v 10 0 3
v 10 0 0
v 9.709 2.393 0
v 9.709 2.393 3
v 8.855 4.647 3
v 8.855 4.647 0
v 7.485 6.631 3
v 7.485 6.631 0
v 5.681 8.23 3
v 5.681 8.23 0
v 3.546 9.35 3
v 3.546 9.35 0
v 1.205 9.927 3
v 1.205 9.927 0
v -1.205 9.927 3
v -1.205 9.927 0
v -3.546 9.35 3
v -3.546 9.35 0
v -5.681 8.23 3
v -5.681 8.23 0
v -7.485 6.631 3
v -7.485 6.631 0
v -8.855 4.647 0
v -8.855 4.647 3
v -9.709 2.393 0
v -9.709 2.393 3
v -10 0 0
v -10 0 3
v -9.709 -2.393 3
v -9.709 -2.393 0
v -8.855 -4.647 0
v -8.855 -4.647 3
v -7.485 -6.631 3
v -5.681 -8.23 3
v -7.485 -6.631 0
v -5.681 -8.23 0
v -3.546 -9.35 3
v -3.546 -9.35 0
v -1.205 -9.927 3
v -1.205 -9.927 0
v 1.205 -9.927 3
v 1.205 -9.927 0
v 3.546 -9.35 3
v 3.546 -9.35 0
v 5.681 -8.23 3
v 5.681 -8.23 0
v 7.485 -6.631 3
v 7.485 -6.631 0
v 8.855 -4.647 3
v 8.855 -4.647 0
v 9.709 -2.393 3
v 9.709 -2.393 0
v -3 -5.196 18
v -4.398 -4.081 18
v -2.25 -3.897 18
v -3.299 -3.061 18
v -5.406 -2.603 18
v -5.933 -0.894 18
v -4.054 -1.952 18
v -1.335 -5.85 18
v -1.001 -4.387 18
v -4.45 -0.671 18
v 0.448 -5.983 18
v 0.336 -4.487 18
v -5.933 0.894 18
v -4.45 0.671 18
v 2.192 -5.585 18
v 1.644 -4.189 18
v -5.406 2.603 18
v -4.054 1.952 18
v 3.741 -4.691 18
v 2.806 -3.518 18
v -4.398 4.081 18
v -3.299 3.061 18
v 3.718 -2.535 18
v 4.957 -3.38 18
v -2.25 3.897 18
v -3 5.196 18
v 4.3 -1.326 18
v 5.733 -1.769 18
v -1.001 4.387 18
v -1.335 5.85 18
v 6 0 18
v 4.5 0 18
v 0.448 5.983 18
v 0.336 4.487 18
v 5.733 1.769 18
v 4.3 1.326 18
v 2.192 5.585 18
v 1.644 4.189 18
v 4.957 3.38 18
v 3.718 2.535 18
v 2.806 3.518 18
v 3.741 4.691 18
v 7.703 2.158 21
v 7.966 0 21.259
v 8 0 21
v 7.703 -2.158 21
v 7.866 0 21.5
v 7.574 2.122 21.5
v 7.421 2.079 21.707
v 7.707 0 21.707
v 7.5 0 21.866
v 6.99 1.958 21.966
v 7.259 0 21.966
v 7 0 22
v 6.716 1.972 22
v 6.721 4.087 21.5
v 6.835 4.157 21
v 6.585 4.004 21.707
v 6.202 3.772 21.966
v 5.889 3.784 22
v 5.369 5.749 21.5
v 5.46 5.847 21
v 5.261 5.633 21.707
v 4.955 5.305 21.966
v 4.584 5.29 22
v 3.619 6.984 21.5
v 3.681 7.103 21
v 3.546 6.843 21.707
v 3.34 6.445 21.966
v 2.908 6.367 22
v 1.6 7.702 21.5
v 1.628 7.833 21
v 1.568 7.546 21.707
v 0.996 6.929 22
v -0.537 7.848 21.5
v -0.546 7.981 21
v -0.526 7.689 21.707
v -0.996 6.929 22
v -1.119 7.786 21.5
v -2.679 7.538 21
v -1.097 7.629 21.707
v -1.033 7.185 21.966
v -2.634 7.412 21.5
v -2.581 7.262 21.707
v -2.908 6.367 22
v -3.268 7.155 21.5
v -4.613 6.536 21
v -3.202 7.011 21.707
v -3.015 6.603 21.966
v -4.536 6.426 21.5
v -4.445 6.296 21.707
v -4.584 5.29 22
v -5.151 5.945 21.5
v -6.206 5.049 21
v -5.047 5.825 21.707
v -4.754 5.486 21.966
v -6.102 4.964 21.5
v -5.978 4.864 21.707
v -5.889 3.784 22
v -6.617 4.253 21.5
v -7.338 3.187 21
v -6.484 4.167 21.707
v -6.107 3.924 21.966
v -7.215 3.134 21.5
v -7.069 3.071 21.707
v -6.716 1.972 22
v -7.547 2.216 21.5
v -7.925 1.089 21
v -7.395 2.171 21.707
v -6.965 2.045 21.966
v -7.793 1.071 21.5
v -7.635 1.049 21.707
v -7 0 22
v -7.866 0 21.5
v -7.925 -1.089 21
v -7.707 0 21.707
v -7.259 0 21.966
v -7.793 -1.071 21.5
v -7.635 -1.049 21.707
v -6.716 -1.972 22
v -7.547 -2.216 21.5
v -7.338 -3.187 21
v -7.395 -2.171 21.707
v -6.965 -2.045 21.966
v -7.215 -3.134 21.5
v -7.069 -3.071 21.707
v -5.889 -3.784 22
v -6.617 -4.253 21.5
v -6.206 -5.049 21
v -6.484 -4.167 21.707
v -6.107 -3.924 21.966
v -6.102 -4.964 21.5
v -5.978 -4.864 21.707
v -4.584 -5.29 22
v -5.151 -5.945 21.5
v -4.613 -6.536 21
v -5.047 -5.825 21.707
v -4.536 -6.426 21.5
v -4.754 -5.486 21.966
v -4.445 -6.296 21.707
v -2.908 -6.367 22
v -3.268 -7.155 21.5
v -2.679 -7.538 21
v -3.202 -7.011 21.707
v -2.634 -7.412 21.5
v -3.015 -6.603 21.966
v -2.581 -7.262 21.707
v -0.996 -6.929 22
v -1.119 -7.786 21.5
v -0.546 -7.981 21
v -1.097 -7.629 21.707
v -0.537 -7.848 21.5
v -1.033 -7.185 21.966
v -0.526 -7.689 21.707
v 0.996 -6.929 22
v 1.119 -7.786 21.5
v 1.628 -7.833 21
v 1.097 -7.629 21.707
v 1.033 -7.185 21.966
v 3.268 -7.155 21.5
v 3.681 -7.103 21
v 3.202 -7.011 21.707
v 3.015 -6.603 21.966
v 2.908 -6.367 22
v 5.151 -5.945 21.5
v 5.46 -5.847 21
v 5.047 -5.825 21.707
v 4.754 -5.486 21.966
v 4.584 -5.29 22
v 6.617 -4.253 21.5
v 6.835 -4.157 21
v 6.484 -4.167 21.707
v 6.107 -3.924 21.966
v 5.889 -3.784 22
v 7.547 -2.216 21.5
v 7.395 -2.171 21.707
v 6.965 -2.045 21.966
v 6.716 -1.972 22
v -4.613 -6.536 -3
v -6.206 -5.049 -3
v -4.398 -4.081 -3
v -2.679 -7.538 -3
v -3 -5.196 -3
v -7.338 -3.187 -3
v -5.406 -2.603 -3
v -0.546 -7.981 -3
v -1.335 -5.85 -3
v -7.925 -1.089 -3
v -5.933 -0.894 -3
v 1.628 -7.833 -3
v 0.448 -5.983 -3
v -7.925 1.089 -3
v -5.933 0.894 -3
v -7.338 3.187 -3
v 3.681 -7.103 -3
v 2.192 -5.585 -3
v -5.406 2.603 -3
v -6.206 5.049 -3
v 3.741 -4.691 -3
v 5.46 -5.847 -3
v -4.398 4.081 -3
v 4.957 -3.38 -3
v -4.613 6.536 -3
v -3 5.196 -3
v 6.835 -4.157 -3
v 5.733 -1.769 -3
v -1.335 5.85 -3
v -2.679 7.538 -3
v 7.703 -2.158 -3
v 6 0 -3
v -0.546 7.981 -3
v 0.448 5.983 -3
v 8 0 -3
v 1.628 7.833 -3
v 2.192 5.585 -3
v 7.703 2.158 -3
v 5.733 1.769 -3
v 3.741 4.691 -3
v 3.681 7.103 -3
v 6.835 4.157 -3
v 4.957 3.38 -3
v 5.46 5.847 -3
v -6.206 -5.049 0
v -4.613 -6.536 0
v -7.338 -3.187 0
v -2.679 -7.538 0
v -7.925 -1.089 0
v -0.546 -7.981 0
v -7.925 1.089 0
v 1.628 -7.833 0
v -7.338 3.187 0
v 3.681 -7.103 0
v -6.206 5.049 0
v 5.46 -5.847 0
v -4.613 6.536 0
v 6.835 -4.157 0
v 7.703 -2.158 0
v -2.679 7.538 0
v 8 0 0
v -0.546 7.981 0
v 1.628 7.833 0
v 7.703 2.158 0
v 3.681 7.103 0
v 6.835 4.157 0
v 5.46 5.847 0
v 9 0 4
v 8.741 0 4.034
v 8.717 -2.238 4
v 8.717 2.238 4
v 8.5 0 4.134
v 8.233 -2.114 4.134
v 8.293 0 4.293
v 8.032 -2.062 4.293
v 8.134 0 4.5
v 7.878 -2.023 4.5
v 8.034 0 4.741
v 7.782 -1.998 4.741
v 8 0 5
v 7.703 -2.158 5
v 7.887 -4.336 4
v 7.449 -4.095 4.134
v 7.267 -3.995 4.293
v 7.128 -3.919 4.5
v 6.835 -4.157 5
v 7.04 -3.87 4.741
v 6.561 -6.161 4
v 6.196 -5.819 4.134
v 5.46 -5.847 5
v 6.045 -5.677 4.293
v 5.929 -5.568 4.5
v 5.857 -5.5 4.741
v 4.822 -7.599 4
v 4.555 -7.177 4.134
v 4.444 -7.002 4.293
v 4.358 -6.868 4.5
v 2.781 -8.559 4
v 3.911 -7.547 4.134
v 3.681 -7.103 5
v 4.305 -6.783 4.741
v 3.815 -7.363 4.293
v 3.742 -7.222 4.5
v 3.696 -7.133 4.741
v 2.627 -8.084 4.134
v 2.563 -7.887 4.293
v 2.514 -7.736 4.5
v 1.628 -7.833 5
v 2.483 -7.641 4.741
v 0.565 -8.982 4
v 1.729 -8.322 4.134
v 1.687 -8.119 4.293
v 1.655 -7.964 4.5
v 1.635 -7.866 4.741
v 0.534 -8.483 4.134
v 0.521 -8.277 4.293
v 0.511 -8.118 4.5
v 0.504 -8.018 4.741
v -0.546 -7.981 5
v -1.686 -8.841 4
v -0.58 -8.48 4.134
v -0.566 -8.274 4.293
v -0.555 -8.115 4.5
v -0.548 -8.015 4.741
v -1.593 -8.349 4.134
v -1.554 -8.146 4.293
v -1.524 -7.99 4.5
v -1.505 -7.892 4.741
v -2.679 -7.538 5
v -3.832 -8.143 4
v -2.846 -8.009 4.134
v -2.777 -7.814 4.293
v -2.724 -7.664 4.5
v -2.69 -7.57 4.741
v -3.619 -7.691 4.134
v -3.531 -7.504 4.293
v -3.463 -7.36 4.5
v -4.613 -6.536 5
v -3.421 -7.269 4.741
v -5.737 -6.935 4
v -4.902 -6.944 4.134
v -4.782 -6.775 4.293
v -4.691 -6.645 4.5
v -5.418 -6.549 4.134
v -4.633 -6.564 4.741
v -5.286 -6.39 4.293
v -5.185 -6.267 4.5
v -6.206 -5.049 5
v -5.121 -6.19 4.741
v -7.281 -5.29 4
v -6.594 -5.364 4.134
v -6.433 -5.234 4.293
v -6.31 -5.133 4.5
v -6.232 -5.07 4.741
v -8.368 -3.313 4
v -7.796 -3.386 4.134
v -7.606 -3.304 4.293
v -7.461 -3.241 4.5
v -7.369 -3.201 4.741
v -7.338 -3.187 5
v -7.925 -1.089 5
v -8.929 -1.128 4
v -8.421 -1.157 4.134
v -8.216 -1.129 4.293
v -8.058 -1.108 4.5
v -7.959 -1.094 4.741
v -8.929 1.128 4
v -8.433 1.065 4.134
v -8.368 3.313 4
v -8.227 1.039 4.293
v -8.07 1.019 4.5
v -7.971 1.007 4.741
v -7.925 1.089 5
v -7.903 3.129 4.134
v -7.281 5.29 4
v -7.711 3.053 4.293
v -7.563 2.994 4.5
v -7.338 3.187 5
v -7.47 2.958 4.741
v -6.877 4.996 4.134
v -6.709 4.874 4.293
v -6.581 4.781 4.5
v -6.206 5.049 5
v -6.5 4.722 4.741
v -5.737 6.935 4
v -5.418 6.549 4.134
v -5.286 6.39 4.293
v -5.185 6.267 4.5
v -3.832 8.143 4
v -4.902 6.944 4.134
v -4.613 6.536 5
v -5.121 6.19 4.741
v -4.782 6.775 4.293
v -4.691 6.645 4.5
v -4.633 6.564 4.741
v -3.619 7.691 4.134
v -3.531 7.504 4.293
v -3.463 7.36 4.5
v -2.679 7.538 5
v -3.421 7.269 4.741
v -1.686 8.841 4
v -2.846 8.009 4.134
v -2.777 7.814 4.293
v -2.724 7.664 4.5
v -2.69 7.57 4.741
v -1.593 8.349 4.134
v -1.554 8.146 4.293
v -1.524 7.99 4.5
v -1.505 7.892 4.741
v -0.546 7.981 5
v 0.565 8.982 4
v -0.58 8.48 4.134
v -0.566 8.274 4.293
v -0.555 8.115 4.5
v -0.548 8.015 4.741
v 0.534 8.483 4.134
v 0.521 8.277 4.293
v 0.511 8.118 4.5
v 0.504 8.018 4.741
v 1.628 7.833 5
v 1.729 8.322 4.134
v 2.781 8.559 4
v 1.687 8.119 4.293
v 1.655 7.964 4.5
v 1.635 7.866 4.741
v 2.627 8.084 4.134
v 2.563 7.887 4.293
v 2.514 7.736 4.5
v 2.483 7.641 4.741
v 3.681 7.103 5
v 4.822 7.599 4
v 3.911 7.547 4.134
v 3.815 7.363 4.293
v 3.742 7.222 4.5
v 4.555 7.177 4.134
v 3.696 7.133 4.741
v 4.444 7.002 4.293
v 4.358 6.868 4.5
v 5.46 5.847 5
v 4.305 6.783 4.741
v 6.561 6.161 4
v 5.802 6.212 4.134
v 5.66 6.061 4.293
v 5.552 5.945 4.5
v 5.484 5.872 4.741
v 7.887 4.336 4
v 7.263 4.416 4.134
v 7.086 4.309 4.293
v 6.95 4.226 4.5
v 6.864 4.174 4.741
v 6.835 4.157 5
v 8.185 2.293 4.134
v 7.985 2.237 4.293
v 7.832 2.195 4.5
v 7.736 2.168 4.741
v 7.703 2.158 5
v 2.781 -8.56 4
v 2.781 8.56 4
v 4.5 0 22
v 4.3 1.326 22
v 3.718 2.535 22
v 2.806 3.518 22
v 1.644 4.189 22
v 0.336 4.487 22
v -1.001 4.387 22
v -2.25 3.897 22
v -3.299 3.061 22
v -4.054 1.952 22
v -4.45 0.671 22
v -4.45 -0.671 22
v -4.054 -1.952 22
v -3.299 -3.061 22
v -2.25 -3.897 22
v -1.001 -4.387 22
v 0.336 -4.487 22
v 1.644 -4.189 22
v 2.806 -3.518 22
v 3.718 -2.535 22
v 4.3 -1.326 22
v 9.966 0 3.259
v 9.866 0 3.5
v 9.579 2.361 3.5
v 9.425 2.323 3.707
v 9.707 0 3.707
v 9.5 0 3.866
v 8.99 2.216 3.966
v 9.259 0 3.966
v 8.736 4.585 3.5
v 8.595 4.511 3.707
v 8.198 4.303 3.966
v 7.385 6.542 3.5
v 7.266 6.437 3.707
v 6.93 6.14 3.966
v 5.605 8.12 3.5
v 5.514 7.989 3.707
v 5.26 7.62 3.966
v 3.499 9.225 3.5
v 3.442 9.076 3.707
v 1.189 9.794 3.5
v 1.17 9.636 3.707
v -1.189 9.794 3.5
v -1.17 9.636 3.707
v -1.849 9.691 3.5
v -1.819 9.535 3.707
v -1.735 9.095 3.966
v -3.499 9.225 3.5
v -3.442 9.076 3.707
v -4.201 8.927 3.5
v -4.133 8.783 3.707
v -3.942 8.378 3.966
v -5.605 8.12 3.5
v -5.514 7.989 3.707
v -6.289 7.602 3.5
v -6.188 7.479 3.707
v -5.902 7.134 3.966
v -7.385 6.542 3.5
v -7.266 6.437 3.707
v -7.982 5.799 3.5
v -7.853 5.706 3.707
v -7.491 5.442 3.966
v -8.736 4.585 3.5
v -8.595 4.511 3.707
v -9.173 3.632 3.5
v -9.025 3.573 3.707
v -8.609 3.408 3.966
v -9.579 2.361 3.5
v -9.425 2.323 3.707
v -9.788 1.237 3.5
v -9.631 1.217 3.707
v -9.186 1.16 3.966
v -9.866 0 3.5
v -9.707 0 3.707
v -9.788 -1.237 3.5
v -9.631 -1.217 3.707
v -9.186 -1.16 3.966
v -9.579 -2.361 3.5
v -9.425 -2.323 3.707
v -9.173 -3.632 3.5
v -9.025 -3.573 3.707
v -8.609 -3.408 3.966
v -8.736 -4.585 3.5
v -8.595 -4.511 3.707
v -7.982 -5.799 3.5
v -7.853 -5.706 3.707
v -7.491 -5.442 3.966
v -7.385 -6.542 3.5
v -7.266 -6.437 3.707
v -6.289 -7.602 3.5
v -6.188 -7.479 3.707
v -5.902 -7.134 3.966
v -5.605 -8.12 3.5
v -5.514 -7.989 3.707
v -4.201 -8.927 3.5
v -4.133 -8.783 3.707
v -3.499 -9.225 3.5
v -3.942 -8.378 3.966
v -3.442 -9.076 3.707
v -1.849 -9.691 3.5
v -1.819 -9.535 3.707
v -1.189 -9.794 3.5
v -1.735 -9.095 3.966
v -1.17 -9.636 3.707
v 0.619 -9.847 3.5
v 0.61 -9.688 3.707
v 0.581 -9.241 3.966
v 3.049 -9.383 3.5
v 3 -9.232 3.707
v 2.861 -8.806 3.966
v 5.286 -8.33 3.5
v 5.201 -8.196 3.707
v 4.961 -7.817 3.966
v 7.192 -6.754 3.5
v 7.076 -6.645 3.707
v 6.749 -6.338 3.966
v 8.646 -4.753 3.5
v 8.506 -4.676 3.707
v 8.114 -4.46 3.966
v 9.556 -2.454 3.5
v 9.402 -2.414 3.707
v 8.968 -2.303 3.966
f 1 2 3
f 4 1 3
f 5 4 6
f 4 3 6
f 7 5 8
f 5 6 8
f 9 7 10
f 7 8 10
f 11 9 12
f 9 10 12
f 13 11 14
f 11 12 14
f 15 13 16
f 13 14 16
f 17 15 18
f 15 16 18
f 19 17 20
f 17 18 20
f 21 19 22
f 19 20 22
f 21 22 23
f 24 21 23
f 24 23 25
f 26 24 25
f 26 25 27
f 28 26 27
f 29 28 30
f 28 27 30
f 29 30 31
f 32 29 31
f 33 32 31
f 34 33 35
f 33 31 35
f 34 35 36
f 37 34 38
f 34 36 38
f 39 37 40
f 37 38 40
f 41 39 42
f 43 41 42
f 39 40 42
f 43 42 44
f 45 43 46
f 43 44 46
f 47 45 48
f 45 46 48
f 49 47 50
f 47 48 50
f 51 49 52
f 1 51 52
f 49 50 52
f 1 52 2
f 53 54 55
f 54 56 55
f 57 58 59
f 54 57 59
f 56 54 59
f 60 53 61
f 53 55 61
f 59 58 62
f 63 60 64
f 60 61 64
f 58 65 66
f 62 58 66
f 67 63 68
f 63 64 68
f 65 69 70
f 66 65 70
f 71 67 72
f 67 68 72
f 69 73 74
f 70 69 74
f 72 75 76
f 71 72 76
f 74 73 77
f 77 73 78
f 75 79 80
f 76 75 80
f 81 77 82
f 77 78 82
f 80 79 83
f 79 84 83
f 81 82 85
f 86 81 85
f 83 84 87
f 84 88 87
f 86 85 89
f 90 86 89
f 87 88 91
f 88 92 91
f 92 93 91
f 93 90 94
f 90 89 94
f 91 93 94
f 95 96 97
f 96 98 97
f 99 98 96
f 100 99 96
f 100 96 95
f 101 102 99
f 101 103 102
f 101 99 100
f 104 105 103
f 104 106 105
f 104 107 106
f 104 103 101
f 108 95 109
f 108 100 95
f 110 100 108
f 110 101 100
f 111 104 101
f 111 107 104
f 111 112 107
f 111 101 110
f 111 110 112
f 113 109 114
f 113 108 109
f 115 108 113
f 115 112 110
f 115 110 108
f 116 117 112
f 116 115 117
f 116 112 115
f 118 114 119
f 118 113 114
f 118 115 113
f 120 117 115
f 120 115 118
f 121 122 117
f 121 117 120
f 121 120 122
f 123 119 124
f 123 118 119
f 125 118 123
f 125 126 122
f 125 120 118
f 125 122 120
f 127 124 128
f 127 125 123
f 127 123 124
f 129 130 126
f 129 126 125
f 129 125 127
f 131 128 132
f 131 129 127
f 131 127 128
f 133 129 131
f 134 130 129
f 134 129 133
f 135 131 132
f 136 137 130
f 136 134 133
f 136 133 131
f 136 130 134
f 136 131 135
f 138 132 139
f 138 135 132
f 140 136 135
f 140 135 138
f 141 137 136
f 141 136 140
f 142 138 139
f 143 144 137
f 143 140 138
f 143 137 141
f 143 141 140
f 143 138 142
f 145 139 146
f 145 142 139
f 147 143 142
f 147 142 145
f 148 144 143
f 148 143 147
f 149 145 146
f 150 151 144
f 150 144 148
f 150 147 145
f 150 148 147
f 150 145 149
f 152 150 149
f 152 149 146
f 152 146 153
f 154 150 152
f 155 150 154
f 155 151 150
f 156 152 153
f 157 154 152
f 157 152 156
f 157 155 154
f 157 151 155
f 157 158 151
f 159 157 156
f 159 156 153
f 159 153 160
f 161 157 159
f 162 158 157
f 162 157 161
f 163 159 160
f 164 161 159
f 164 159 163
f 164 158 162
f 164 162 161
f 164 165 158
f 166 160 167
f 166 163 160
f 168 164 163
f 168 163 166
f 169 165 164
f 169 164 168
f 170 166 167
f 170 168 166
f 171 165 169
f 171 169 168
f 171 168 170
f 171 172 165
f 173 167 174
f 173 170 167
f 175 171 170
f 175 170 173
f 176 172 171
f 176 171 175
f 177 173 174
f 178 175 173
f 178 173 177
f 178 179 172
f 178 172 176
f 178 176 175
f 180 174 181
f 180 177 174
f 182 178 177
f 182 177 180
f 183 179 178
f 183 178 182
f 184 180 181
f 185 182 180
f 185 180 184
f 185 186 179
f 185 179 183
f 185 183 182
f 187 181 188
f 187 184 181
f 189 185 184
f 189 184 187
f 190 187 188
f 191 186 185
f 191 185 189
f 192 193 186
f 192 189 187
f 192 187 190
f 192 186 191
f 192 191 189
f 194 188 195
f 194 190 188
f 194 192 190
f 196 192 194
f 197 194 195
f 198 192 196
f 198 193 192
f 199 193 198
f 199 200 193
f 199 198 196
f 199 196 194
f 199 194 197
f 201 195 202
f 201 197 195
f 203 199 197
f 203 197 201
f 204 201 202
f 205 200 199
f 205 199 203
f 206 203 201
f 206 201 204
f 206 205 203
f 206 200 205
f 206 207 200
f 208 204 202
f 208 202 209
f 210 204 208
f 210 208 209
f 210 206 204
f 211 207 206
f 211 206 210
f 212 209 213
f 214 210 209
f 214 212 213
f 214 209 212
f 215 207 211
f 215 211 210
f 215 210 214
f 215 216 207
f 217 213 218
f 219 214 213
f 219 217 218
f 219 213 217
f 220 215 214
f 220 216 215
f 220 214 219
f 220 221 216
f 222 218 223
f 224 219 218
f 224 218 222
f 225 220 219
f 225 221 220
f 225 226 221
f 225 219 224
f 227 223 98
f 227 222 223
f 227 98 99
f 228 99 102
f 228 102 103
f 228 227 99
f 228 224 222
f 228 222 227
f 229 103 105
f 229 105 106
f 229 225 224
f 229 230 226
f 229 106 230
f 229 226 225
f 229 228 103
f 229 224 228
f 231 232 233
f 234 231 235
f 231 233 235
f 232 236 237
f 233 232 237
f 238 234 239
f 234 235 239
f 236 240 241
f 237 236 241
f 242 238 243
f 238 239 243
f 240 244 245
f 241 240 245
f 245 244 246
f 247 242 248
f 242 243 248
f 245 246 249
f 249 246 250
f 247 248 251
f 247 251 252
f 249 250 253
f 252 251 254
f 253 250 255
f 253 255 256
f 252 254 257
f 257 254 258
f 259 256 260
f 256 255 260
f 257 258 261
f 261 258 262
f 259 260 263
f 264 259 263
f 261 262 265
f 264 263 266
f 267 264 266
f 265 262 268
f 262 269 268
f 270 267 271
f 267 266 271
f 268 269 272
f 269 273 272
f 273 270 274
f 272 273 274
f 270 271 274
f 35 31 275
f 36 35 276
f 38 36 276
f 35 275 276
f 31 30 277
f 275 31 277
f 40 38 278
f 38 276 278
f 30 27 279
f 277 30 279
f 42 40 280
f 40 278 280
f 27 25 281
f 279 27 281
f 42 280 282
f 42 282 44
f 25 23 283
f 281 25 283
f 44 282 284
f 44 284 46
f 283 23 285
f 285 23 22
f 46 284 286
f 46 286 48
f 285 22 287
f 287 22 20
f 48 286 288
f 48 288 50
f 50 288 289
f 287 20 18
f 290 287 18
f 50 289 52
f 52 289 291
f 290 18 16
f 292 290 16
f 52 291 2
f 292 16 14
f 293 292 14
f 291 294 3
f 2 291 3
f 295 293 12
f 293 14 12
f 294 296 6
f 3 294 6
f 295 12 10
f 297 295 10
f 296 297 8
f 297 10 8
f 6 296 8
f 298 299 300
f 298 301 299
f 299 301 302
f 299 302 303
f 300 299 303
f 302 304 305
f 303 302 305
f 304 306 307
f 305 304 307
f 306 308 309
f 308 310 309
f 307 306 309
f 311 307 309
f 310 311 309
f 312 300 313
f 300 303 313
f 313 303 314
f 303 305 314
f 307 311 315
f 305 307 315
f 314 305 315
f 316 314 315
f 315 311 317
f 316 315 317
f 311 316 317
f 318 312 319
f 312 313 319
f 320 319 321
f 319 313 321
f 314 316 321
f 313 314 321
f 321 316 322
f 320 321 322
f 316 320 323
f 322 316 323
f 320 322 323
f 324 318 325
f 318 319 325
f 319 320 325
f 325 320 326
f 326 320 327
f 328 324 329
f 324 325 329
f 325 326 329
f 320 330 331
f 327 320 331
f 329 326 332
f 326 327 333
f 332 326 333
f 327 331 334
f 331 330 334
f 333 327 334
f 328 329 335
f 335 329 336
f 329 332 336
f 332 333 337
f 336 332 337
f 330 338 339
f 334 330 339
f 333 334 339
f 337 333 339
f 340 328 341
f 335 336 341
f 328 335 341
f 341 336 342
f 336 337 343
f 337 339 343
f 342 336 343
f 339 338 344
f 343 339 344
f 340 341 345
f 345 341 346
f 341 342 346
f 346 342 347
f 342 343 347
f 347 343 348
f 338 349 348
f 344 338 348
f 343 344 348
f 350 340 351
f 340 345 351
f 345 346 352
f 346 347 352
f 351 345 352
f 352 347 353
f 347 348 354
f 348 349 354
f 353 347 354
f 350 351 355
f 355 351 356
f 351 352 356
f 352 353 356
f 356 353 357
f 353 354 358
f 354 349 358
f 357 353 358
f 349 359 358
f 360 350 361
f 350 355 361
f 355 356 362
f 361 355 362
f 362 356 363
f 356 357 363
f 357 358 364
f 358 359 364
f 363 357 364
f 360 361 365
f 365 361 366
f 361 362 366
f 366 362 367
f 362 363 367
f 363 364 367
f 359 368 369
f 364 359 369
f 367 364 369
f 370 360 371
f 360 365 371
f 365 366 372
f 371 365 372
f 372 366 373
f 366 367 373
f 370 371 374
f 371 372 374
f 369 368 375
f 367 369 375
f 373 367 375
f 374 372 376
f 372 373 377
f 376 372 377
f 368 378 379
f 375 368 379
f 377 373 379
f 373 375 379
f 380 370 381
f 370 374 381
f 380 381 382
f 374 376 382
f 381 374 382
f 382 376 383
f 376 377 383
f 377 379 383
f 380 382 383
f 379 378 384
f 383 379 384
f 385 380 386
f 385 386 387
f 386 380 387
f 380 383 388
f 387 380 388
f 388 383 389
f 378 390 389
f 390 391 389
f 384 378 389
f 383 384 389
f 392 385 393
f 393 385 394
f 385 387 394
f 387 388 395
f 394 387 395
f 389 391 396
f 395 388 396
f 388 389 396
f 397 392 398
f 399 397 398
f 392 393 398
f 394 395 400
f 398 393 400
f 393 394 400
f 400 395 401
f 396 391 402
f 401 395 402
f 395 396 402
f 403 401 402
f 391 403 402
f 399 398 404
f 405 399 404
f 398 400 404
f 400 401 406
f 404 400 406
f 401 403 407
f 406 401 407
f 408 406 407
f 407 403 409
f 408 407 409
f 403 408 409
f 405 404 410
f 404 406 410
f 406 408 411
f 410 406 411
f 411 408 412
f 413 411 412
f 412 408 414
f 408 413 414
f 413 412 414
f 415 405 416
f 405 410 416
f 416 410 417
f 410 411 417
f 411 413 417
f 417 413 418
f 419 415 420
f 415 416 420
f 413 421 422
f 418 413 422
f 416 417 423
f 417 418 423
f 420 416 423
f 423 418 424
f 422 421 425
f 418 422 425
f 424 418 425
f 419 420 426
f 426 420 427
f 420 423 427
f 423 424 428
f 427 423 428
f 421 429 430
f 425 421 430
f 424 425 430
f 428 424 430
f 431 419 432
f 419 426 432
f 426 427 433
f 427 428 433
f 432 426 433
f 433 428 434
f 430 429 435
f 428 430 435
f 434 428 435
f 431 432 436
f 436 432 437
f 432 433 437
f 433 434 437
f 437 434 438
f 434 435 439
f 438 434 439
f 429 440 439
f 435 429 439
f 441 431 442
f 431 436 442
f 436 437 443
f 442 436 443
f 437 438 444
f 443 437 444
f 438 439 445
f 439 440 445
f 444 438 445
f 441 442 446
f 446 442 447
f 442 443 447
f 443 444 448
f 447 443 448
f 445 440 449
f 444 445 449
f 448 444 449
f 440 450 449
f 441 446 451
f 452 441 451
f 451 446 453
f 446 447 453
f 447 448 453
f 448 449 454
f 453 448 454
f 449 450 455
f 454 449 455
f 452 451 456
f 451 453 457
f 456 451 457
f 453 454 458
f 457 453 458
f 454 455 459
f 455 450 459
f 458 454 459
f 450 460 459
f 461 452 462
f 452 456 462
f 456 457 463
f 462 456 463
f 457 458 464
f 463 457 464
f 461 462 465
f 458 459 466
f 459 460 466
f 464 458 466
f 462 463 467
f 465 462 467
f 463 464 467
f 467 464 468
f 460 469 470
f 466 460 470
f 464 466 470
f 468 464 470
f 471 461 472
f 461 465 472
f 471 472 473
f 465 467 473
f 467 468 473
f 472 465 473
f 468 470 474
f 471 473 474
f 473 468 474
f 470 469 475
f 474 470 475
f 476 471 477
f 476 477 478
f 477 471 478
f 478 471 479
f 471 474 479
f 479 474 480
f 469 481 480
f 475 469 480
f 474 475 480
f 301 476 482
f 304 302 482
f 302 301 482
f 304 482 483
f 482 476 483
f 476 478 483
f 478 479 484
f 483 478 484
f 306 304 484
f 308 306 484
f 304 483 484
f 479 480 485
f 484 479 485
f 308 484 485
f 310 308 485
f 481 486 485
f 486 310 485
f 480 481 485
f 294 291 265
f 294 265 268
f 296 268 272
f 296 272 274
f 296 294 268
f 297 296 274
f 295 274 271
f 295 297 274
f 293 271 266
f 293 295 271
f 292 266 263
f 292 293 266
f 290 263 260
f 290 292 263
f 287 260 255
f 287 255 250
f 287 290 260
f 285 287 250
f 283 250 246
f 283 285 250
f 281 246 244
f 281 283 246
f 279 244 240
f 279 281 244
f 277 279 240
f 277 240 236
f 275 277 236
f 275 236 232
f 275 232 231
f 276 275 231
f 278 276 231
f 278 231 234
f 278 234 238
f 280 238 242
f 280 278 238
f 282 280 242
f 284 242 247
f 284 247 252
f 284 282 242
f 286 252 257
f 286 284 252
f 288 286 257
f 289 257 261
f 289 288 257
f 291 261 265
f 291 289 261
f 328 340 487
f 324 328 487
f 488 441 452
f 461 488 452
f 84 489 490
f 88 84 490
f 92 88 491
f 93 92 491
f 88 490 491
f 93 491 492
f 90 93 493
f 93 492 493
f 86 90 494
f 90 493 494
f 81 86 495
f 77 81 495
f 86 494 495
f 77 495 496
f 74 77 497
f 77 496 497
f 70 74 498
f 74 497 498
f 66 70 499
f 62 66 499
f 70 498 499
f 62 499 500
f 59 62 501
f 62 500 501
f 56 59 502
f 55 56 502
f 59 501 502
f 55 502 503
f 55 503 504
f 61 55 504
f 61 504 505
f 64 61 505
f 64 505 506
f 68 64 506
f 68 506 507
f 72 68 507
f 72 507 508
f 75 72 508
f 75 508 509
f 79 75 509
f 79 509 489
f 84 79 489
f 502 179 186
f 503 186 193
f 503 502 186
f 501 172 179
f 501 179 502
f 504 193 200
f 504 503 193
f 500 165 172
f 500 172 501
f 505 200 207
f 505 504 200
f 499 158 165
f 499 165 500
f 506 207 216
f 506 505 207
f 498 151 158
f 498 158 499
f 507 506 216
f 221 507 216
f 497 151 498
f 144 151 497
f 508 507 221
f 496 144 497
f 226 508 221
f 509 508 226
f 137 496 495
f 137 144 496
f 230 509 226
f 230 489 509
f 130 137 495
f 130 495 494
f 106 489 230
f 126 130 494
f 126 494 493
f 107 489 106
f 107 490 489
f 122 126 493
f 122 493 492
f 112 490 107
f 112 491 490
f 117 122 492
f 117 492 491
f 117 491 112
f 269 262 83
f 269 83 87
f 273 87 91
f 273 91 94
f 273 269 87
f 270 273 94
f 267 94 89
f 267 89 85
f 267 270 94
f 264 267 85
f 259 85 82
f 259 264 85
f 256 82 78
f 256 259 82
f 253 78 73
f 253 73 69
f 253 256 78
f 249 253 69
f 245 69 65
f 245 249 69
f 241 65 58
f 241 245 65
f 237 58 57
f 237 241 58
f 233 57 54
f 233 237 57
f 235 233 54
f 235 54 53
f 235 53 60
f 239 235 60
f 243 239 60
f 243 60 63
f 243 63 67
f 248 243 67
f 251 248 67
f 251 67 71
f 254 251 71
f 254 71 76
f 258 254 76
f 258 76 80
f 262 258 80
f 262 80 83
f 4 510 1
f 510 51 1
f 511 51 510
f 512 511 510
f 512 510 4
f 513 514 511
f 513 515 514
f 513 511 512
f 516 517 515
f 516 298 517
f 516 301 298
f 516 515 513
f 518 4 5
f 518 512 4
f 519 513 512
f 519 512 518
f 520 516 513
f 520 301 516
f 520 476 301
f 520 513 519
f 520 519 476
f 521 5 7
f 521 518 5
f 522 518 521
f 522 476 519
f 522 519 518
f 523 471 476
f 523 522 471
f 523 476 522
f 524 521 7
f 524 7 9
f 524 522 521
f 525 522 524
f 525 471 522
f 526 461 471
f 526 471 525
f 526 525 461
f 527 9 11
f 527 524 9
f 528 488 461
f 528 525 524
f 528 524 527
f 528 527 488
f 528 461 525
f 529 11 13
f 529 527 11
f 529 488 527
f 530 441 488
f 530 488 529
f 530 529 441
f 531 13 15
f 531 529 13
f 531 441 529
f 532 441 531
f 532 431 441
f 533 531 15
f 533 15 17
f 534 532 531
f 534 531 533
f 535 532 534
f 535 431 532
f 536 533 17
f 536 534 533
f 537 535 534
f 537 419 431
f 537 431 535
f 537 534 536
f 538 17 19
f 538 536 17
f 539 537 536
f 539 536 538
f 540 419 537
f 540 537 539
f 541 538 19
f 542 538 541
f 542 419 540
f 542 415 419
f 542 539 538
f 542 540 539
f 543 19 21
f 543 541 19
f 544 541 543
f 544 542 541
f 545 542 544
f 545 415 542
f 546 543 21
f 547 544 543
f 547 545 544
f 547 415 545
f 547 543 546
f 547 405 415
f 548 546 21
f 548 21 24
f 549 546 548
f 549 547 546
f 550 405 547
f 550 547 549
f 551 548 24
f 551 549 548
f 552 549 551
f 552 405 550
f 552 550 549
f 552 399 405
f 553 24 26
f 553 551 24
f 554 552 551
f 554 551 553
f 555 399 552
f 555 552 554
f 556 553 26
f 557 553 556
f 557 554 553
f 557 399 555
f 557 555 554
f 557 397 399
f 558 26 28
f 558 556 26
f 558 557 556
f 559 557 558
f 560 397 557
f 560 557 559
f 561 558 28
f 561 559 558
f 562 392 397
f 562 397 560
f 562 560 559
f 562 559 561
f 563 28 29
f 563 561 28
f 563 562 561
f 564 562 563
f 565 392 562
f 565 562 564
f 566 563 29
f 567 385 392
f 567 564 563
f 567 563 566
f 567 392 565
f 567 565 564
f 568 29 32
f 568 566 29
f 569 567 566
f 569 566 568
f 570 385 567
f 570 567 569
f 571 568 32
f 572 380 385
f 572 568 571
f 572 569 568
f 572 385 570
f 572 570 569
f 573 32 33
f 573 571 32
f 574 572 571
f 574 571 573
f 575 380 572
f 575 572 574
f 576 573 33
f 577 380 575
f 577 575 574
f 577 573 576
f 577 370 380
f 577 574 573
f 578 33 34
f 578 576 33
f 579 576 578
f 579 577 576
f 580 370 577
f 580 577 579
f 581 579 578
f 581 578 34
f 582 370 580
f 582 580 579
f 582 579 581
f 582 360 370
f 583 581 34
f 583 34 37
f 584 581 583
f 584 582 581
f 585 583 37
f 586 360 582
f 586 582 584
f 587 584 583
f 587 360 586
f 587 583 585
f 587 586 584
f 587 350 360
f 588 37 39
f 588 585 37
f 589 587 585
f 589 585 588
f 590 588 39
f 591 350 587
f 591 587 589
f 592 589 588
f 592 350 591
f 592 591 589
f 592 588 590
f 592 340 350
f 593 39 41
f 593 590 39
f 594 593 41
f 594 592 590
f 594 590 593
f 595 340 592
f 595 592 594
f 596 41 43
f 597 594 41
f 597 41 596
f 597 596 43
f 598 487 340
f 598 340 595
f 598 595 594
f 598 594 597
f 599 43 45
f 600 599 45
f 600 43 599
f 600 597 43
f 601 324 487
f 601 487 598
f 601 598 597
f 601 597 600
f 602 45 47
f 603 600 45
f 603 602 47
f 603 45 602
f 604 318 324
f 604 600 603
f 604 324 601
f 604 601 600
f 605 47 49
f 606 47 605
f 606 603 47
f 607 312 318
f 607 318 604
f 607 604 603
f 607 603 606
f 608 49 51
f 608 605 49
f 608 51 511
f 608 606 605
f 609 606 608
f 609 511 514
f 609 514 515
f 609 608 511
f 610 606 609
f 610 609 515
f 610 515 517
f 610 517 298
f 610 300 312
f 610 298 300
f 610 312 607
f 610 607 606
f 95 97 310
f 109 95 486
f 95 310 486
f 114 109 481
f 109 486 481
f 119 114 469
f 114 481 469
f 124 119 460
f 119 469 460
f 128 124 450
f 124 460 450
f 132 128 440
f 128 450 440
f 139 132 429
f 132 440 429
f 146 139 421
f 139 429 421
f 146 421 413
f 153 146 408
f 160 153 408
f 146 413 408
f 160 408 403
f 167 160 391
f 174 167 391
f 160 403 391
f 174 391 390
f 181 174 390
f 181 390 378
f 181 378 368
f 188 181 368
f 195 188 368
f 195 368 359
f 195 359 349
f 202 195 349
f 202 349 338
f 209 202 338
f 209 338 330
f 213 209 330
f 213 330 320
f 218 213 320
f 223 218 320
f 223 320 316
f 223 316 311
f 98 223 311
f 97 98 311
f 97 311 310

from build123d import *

# Parameters (mm, degrees)
F0_R          = 8
F0_R_2        = 6
F1_DEPTH      = 3
F0_R_3        = 10
F2_DEPTH      = 4
F3_DEPTH      = 25
F4_START      = 18
F4_DEPTH      = 4
F5_R          = 0.99999
F6_R          = 4.5
F7_DEPTH      = 25
F7_DEPTH_BACK = 25


# Not quite as in the source:
# - a fillet or chamfer is up to 0.001 mm smaller than in the source, because OpenCascade refuses the exact size


with BuildPart() as f1:
    # F0 (on Top) → F1 (new body)
    with BuildSketch(Plane.XY):
        Circle(F0_R)
        Circle(F0_R_2, mode=Mode.SUBTRACT)
    extrude(amount=-F1_DEPTH)

    # F0 (on Top) → F2 (join)
    with BuildSketch(Plane.XY):
        Circle(F0_R_3)
        Circle(F0_R, mode=Mode.SUBTRACT)
        Circle(F0_R)
        Circle(F0_R_2, mode=Mode.SUBTRACT)
    extrude(amount=F2_DEPTH)

    # F3 (add): a face of the model
    f3_faces = [f1.faces().sort_by_distance(p)[0] for p in [
        (-7.77372583, 0, -3),
    ]]
    extrude(f3_faces, amount=-F3_DEPTH)

    # F0 (on Top) → F4 (join)
    with BuildSketch(Plane.XY.offset(F4_START)):
        Circle(F0_R_2)
    extrude(amount=F4_DEPTH)

    # F5 (radius 1 in the source; OpenCascade refuses exactly that, so slightly less here)
    f5_edges = [f1.edges().sort_by_distance(p)[0] for p in [
        (-8, 0, 4),
        (-10, 0, 4),
        (-8, 0, 22),
    ]]
    fillet(f5_edges, radius=F5_R)

    # F6 (on face) → F7 (cut, two sides)
    with BuildSketch(Plane.XY.offset(22)) as f7_sk:
        Circle(F6_R)
    extrude(amount=-F7_DEPTH, mode=Mode.SUBTRACT)
    extrude(f7_sk.sketch, amount=F7_DEPTH_BACK, mode=Mode.SUBTRACT)


solid = f1.part
